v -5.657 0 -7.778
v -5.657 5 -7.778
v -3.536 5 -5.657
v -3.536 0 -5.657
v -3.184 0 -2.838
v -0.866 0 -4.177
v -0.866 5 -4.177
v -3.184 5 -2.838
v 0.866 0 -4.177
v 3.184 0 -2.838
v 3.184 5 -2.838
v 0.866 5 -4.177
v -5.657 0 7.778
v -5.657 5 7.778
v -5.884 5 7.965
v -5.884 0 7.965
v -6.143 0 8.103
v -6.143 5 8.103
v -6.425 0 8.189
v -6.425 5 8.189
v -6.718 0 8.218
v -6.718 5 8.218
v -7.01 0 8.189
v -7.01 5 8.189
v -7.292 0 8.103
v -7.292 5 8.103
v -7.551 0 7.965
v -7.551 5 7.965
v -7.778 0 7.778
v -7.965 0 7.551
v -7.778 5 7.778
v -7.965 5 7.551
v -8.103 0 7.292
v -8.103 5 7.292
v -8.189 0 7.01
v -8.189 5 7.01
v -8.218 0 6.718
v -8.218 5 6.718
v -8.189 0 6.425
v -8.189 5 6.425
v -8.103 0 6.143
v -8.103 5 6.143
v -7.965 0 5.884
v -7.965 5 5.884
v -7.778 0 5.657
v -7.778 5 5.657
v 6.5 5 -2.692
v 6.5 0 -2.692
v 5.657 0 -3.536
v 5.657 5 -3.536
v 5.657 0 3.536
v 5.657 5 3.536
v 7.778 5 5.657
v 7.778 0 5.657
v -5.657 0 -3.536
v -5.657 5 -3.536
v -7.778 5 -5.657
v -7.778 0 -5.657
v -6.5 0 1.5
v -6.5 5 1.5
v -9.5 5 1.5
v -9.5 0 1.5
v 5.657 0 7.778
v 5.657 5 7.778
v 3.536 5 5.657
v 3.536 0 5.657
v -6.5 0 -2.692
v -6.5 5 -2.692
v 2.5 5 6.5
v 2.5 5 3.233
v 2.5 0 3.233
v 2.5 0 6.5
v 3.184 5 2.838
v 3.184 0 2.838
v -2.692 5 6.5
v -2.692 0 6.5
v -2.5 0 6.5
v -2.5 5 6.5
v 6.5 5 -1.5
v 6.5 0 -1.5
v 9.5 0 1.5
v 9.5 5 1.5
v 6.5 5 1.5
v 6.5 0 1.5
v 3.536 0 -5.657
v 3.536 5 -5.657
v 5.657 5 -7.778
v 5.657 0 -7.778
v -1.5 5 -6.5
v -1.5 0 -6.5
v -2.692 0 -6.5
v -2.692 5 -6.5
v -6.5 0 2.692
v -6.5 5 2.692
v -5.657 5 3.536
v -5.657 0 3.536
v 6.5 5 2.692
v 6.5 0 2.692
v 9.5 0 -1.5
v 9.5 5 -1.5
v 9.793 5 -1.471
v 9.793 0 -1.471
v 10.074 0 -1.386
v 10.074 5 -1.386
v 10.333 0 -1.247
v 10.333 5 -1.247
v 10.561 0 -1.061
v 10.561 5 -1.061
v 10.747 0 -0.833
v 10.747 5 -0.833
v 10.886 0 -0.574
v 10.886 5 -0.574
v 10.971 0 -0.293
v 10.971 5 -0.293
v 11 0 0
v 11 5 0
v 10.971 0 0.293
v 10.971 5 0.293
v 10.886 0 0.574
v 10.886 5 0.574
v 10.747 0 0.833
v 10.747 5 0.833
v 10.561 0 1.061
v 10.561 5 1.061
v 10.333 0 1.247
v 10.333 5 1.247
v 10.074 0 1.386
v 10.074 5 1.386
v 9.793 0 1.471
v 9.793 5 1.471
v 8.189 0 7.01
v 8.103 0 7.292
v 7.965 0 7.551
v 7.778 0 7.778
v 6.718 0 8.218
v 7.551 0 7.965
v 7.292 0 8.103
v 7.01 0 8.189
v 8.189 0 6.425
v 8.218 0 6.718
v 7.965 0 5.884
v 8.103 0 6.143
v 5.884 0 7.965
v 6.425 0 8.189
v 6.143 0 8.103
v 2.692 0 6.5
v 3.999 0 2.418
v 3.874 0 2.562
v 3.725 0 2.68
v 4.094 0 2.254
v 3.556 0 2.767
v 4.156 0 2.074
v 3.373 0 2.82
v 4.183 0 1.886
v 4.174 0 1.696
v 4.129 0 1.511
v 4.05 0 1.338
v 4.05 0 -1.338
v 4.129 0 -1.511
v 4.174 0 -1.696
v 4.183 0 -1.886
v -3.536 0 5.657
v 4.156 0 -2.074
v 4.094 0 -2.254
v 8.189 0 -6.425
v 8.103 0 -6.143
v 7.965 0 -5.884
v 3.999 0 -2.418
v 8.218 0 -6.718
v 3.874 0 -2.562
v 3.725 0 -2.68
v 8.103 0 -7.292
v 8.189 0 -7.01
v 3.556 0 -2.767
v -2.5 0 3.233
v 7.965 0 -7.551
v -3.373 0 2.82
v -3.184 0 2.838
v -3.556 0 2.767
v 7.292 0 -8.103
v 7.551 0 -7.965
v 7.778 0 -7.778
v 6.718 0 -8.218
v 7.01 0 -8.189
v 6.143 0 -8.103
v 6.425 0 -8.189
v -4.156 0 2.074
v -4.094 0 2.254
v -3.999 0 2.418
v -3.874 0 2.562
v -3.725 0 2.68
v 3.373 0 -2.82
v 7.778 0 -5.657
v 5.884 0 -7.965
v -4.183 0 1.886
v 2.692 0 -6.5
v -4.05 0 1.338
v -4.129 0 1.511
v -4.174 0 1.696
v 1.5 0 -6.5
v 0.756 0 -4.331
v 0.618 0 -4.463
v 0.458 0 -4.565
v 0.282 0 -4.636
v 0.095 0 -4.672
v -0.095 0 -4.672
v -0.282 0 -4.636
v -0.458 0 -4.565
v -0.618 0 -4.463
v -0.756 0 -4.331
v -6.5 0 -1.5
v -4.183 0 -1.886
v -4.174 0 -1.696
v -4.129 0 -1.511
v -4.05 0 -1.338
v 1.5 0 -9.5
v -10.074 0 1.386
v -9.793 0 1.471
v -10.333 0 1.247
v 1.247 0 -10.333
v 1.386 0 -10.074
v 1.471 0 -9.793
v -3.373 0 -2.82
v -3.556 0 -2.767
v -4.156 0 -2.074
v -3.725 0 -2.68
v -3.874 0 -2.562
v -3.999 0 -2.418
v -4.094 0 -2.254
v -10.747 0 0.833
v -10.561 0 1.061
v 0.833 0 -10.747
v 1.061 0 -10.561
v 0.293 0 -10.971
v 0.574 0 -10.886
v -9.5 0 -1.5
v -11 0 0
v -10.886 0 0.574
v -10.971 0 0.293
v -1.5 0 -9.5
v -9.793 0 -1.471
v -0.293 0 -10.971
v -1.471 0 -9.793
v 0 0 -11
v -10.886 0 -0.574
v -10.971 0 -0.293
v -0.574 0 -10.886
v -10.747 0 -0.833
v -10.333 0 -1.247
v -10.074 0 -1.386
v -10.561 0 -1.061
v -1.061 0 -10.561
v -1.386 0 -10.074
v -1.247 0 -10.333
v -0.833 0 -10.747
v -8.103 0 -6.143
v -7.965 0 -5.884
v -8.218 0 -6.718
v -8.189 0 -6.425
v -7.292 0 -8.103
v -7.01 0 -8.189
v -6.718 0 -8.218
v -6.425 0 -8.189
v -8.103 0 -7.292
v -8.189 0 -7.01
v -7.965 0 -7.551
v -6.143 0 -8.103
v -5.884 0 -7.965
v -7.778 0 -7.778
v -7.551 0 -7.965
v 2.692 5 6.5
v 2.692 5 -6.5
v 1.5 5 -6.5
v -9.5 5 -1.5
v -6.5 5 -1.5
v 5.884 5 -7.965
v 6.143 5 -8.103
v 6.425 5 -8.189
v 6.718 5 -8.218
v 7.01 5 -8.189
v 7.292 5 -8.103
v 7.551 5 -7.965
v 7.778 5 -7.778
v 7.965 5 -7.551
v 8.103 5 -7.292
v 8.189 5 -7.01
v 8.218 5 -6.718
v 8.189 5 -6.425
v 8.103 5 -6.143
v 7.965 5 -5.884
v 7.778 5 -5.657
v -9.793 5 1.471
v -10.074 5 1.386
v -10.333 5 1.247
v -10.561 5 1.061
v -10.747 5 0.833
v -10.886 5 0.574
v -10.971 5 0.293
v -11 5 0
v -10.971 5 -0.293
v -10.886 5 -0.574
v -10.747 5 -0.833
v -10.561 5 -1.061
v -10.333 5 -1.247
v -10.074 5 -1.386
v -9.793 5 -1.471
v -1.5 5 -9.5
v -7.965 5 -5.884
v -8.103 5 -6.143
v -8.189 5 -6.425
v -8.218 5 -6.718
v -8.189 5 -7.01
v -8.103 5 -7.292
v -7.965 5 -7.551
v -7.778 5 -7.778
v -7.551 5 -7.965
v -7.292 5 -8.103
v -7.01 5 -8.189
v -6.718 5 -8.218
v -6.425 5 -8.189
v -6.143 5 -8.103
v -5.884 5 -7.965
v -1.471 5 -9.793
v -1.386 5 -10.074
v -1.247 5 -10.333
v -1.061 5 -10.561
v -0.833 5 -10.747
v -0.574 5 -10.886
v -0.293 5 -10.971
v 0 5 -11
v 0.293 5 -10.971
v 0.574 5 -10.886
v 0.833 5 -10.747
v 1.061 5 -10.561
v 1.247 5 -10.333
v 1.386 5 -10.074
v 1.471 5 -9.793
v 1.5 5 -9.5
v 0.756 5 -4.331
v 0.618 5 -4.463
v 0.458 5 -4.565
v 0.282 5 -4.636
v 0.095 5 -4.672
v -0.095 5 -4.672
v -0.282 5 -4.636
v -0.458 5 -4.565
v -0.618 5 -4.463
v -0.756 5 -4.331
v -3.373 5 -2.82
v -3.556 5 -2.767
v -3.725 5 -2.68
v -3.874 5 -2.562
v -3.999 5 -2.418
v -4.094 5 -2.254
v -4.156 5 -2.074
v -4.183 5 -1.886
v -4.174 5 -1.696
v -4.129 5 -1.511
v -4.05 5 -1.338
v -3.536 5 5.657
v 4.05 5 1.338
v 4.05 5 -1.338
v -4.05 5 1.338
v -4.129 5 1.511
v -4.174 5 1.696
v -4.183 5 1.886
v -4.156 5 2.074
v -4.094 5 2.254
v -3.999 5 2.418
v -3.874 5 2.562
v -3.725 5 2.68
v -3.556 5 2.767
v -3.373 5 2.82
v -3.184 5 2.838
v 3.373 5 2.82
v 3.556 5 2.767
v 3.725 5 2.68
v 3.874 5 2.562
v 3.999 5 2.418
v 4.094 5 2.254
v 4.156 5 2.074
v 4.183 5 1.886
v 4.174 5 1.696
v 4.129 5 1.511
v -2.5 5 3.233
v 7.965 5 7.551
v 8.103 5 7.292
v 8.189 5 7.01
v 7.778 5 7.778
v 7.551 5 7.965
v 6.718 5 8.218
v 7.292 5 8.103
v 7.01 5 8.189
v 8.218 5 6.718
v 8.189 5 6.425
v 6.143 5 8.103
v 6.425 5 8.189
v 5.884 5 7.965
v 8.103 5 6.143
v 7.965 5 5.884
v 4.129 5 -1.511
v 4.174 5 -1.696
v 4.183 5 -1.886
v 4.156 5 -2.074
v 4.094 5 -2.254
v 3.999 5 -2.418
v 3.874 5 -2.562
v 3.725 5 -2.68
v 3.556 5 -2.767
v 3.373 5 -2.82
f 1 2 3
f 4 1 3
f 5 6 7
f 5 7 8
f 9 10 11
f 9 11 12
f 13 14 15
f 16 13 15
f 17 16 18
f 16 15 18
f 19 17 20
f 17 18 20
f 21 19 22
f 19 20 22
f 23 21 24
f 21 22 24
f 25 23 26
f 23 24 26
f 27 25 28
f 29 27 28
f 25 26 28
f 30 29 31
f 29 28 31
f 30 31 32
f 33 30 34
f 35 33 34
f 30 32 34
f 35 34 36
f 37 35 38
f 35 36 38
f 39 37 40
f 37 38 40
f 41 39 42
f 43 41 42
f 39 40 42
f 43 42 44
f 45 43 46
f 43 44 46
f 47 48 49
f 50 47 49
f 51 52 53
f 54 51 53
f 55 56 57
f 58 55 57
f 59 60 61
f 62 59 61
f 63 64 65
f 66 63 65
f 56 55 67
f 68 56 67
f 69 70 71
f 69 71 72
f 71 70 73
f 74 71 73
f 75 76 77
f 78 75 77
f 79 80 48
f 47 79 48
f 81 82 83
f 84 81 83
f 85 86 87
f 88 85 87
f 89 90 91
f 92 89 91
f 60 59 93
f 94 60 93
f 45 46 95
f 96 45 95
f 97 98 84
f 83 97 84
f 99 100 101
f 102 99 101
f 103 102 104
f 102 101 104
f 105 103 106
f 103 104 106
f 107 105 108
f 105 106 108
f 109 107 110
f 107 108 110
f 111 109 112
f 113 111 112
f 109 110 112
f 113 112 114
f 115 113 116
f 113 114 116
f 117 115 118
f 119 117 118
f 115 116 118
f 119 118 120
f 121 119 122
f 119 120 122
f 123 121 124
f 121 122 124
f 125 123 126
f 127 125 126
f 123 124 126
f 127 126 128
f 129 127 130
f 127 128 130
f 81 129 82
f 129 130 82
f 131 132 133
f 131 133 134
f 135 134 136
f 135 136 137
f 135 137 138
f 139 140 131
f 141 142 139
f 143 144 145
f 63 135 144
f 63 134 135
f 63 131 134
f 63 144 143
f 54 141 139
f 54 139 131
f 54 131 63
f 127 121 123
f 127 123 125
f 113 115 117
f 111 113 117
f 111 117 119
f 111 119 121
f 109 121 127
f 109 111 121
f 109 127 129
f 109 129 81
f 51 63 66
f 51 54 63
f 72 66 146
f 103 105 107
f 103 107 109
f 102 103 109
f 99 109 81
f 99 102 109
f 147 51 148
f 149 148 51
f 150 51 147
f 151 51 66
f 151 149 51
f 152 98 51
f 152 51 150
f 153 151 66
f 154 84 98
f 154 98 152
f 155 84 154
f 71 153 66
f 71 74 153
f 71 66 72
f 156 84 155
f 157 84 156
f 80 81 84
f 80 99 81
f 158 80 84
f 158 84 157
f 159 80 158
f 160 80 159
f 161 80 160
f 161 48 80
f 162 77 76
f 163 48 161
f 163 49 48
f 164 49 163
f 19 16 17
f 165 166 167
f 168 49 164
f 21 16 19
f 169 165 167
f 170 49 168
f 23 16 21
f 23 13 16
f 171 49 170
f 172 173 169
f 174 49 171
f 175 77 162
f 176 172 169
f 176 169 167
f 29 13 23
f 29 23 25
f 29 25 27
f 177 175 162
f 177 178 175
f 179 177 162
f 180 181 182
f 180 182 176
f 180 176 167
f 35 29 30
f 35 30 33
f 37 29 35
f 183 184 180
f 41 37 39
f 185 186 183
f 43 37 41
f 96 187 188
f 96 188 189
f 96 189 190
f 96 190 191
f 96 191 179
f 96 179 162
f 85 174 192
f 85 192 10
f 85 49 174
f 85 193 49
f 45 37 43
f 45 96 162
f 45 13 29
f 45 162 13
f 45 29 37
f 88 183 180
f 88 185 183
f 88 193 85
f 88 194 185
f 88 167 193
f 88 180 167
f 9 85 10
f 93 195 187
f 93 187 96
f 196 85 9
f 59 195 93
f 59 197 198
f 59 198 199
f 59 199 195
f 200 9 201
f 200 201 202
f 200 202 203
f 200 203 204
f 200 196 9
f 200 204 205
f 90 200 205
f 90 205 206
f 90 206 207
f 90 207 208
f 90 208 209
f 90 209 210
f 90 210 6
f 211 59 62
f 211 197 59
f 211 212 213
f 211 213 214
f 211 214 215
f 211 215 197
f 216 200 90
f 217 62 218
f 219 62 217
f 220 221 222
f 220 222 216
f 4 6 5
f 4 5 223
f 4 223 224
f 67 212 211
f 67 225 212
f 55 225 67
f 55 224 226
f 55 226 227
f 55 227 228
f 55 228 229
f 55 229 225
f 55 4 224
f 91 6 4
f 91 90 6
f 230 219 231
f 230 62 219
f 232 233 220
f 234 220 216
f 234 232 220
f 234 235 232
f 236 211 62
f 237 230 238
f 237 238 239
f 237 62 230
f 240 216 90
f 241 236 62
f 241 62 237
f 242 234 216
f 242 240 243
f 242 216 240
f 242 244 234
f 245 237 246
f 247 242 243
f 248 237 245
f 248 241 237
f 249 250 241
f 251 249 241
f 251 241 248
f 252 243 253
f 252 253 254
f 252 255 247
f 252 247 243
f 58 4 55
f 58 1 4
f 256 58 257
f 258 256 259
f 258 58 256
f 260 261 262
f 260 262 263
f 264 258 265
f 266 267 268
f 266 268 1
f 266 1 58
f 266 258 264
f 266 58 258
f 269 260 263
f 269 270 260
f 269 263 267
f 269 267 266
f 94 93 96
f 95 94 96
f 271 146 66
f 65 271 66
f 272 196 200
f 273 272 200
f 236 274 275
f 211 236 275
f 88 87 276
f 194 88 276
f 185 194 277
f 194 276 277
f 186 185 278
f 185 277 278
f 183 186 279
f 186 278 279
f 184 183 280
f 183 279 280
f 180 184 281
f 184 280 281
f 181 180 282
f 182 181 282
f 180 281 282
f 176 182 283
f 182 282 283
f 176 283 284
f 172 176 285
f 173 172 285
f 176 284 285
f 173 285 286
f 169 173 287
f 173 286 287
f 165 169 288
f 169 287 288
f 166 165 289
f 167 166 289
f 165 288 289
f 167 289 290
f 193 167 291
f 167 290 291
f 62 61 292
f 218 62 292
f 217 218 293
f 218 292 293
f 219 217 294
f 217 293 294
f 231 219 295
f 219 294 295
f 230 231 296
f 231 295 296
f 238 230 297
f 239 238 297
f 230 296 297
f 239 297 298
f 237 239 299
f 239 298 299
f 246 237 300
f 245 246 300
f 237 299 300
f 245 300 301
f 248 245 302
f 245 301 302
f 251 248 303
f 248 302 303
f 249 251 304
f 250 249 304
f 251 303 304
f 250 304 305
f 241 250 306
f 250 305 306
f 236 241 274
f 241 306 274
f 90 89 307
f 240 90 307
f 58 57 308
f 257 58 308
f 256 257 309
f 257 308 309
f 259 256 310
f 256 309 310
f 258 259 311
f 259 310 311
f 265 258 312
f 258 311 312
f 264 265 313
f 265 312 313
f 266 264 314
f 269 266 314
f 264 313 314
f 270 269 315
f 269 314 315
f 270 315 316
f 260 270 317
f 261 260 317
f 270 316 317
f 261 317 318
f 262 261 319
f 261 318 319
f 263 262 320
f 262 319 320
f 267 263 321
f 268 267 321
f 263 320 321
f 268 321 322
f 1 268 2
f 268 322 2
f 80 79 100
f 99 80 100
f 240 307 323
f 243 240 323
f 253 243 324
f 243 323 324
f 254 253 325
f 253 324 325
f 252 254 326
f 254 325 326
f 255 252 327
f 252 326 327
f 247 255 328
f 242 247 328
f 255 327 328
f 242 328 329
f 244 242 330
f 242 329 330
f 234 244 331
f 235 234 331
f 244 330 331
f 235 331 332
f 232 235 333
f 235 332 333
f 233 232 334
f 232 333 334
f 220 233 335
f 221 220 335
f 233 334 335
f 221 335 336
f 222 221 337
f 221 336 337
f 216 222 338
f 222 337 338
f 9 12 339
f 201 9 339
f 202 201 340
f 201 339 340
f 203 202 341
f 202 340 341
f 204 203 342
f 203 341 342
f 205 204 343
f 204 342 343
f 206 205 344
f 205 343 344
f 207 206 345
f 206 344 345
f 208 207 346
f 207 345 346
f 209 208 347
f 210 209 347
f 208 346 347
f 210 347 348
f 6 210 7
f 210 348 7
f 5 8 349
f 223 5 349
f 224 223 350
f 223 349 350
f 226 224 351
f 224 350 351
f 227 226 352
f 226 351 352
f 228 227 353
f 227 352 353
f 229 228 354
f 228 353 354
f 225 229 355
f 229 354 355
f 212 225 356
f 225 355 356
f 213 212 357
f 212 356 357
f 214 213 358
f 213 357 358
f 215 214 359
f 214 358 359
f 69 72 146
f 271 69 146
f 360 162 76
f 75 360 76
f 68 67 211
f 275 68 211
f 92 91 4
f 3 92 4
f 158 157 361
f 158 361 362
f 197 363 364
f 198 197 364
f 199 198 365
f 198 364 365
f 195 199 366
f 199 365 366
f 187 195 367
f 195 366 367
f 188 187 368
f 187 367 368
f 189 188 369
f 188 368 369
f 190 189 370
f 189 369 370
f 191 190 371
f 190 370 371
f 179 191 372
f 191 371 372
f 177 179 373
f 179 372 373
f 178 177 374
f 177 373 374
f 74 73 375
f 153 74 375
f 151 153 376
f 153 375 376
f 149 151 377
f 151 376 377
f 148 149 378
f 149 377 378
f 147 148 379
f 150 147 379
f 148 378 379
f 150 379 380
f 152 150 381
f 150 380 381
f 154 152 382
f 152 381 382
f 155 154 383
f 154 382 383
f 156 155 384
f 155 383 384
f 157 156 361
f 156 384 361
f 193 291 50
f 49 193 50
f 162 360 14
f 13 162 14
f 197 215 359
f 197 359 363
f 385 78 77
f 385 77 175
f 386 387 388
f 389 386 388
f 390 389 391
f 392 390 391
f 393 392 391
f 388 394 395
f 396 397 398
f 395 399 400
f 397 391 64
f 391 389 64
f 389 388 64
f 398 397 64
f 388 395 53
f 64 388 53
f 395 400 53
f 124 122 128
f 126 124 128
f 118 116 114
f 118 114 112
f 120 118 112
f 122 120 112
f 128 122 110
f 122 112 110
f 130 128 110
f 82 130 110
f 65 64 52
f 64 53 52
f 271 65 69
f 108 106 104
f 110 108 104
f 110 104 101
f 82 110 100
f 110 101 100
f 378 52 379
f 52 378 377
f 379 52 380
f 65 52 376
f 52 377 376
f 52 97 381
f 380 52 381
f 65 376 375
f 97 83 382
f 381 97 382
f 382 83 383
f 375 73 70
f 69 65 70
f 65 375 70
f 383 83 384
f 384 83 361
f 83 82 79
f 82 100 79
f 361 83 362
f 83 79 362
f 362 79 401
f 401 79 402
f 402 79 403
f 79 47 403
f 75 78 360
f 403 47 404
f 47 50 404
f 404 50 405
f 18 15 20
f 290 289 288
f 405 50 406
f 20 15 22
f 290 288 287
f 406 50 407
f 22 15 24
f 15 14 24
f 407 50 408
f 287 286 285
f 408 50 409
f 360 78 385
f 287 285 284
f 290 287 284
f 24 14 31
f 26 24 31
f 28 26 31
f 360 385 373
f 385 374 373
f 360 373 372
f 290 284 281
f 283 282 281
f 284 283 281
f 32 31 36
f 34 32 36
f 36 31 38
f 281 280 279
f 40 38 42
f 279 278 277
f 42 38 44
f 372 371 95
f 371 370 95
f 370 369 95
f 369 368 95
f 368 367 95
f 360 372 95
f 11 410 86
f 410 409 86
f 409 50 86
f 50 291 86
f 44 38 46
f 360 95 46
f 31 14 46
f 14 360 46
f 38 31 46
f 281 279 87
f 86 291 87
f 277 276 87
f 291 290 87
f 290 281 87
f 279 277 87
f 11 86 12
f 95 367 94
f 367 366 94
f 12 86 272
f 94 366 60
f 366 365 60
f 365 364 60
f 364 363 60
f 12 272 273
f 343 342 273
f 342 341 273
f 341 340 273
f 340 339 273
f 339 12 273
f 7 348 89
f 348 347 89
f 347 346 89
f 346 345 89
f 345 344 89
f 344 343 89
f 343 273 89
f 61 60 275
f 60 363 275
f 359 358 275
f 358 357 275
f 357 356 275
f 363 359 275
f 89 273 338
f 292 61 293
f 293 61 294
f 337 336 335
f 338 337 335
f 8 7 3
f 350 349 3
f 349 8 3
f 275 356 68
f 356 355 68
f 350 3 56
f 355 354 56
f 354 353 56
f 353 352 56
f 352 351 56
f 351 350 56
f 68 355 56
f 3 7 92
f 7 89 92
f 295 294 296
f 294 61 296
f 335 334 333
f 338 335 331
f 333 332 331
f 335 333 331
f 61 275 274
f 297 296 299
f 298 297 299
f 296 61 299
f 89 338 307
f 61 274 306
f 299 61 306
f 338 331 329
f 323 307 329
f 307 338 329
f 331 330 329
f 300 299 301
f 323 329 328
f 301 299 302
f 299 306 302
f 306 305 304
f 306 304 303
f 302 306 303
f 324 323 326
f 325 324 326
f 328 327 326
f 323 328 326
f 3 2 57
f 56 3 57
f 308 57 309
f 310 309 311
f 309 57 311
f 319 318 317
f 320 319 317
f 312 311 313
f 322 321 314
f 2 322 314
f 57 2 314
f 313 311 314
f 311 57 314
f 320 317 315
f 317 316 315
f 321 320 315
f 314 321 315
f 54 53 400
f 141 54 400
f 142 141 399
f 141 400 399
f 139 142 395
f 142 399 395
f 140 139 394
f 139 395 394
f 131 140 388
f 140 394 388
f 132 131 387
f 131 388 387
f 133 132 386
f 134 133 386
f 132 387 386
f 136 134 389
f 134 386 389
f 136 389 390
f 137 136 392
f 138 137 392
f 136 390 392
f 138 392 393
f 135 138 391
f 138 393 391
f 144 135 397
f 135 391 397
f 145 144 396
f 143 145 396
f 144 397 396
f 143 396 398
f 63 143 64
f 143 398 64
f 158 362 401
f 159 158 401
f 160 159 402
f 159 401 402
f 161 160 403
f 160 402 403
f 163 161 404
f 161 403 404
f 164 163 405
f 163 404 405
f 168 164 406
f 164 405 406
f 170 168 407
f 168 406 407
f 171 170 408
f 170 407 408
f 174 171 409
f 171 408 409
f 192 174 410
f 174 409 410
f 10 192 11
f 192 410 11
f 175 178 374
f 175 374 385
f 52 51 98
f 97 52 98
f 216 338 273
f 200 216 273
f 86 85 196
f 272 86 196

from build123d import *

# Parameters (mm, degrees)
EXTRUDE_2_DEPTH          = 5
CUT_EXTRUDE_1_DEPTH      = 5
SKETCH_5_R               = 1
CUT_EXTRUDE_2_DEPTH      = 5
PATTERN_CIRCULAR_1_COUNT = 6
CUT_EXTRUDE_3_DEPTH      = 10
EXTRUDE_3_DEPTH          = 5


with BuildPart() as part:
    # 스케치3 → 보스-돌출2 (new body)
    with BuildSketch(Plane(origin=(0, 0, 0), x_dir=(1, 0, 0), z_dir=(0, 1, 0))):
        Polygon((2.692388155, 6.5), (-2.692388155, 6.5), (-6.5, 2.692388155), (-6.5, -2.692388155), (-2.692388155, -6.5), (2.692388155, -6.5), (6.5, -2.692388155), (6.5, 2.692388155), align=None)
    extrude(amount=EXTRUDE_2_DEPTH)

    # 스케치4 → 컷-돌출1 (cut)
    with BuildSketch(Plane(origin=(0, 5, 0), x_dir=(1, 0, 0), z_dir=(0, 1, 0))):
        Polygon((4.05, 2.33826859), (0, 4.67653718), (-4.05, 2.33826859), (-4.05, -2.33826859), (0, -4.67653718), (4.05, -2.33826859), align=None)
    extrude(amount=-CUT_EXTRUDE_1_DEPTH, mode=Mode.SUBTRACT)

    # 스케치5 → 컷-돌출2 (cut)
    with BuildSketch(Plane(origin=(0, 5, 0), x_dir=(1, 0, 0), z_dir=(0, 1, 0))):
        with Locations((0, 3.67653718)):
            Circle(SKETCH_5_R)
    cut_extrude_2 = extrude(amount=-CUT_EXTRUDE_2_DEPTH, mode=Mode.SUBTRACT)

    # 원형 패턴1: 컷-돌출2 ×6 about axis
    pattern_circular_1_axis = Axis((0, 0, 0), (0, 1, 0))
    for i in range(1, PATTERN_CIRCULAR_1_COUNT):
        add(cut_extrude_2.rotate(pattern_circular_1_axis, i * 360 / PATTERN_CIRCULAR_1_COUNT), mode=Mode.SUBTRACT)

    # 스케치8 → 컷-돌출3 (cut)
    with BuildSketch(Plane(origin=(0, 5, 0), x_dir=(1, 0, 0), z_dir=(0, 1, 0))):
        with BuildLine():
            Line((2.5, 0), (2.5, -9.615491692))
            ThreePointArc((2.5, -9.615491692), (0, -12.115491692), (-2.5, -9.615491692))
            Line((-2.5, -9.615491692), (-2.5, 0))
            ThreePointArc((-2.5, 0), (0, 2.5), (2.5, 0))
        make_face()
    extrude(amount=-CUT_EXTRUDE_3_DEPTH, mode=Mode.SUBTRACT)

    # 스케치10 → 보스-돌출3 (add)
    with BuildSketch(Plane(origin=(0, 5, 0), x_dir=(1, 0, 0), z_dir=(0, 1, 0))):
        with BuildLine():
            Line((-3.535533906, -5.656854249), (-5.656854249, -7.778174593))
            ThreePointArc((-5.656854249, -7.778174593), (-7.778174593, -7.778174593), (-7.778174593, -5.656854249))
            Line((-7.778174593, -5.656854249), (-5.656854249, -3.535533906))
            ThreePointArc((-5.656854249, -3.535533906), (-3.535533906, -3.535533906), (-3.535533906, -5.656854249))
        make_face()
        with BuildLine():
            Line((-6.5, -1.5), (-9.5, -1.5))
            ThreePointArc((-9.5, -1.5), (-11, 0), (-9.5, 1.5))
            Line((-9.5, 1.5), (-6.5, 1.5))
            ThreePointArc((-6.5, 1.5), (-5, 0), (-6.5, -1.5))
        make_face()
        with BuildLine():
            Line((-5.656854249, 3.535533906), (-7.778174593, 5.656854249))
            ThreePointArc((-7.778174593, 5.656854249), (-7.778174593, 7.778174593), (-5.656854249, 7.778174593))
            Line((-5.656854249, 7.778174593), (-3.535533906, 5.656854249))
            ThreePointArc((-3.535533906, 5.656854249), (-3.535533906, 3.535533906), (-5.656854249, 3.535533906))
        make_face()
        with BuildLine():
            Line((-1.5, 6.5), (-1.5, 9.5))
            ThreePointArc((-1.5, 9.5), (0, 11), (1.5, 9.5))
            Line((1.5, 9.5), (1.5, 6.5))
            ThreePointArc((1.5, 6.5), (0, 5), (-1.5, 6.5))
        make_face()
        with BuildLine():
            Line((3.535533906, 5.656854249), (5.656854249, 7.778174593))
            ThreePointArc((5.656854249, 7.778174593), (7.778174593, 7.778174593), (7.778174593, 5.656854249))
            Line((7.778174593, 5.656854249), (5.656854249, 3.535533906))
            ThreePointArc((5.656854249, 3.535533906), (3.535533906, 3.535533906), (3.535533906, 5.656854249))
        make_face()
        with BuildLine():
            Line((6.5, 1.5), (9.5, 1.5))
            ThreePointArc((9.5, 1.5), (11, 0), (9.5, -1.5))
            Line((9.5, -1.5), (6.5, -1.5))
            ThreePointArc((6.5, -1.5), (5, 0), (6.5, 1.5))
        make_face()
        with BuildLine():
            Line((5.656854249, -3.535533906), (7.778174593, -5.656854249))
            ThreePointArc((7.778174593, -5.656854249), (7.778174593, -7.778174593), (5.656854249, -7.778174593))
            Line((5.656854249, -7.778174593), (3.535533906, -5.656854249))
            ThreePointArc((3.535533906, -5.656854249), (3.535533906, -3.535533906), (5.656854249, -3.535533906))
        make_face()
    extrude(amount=-EXTRUDE_3_DEPTH)


solid = part.part
